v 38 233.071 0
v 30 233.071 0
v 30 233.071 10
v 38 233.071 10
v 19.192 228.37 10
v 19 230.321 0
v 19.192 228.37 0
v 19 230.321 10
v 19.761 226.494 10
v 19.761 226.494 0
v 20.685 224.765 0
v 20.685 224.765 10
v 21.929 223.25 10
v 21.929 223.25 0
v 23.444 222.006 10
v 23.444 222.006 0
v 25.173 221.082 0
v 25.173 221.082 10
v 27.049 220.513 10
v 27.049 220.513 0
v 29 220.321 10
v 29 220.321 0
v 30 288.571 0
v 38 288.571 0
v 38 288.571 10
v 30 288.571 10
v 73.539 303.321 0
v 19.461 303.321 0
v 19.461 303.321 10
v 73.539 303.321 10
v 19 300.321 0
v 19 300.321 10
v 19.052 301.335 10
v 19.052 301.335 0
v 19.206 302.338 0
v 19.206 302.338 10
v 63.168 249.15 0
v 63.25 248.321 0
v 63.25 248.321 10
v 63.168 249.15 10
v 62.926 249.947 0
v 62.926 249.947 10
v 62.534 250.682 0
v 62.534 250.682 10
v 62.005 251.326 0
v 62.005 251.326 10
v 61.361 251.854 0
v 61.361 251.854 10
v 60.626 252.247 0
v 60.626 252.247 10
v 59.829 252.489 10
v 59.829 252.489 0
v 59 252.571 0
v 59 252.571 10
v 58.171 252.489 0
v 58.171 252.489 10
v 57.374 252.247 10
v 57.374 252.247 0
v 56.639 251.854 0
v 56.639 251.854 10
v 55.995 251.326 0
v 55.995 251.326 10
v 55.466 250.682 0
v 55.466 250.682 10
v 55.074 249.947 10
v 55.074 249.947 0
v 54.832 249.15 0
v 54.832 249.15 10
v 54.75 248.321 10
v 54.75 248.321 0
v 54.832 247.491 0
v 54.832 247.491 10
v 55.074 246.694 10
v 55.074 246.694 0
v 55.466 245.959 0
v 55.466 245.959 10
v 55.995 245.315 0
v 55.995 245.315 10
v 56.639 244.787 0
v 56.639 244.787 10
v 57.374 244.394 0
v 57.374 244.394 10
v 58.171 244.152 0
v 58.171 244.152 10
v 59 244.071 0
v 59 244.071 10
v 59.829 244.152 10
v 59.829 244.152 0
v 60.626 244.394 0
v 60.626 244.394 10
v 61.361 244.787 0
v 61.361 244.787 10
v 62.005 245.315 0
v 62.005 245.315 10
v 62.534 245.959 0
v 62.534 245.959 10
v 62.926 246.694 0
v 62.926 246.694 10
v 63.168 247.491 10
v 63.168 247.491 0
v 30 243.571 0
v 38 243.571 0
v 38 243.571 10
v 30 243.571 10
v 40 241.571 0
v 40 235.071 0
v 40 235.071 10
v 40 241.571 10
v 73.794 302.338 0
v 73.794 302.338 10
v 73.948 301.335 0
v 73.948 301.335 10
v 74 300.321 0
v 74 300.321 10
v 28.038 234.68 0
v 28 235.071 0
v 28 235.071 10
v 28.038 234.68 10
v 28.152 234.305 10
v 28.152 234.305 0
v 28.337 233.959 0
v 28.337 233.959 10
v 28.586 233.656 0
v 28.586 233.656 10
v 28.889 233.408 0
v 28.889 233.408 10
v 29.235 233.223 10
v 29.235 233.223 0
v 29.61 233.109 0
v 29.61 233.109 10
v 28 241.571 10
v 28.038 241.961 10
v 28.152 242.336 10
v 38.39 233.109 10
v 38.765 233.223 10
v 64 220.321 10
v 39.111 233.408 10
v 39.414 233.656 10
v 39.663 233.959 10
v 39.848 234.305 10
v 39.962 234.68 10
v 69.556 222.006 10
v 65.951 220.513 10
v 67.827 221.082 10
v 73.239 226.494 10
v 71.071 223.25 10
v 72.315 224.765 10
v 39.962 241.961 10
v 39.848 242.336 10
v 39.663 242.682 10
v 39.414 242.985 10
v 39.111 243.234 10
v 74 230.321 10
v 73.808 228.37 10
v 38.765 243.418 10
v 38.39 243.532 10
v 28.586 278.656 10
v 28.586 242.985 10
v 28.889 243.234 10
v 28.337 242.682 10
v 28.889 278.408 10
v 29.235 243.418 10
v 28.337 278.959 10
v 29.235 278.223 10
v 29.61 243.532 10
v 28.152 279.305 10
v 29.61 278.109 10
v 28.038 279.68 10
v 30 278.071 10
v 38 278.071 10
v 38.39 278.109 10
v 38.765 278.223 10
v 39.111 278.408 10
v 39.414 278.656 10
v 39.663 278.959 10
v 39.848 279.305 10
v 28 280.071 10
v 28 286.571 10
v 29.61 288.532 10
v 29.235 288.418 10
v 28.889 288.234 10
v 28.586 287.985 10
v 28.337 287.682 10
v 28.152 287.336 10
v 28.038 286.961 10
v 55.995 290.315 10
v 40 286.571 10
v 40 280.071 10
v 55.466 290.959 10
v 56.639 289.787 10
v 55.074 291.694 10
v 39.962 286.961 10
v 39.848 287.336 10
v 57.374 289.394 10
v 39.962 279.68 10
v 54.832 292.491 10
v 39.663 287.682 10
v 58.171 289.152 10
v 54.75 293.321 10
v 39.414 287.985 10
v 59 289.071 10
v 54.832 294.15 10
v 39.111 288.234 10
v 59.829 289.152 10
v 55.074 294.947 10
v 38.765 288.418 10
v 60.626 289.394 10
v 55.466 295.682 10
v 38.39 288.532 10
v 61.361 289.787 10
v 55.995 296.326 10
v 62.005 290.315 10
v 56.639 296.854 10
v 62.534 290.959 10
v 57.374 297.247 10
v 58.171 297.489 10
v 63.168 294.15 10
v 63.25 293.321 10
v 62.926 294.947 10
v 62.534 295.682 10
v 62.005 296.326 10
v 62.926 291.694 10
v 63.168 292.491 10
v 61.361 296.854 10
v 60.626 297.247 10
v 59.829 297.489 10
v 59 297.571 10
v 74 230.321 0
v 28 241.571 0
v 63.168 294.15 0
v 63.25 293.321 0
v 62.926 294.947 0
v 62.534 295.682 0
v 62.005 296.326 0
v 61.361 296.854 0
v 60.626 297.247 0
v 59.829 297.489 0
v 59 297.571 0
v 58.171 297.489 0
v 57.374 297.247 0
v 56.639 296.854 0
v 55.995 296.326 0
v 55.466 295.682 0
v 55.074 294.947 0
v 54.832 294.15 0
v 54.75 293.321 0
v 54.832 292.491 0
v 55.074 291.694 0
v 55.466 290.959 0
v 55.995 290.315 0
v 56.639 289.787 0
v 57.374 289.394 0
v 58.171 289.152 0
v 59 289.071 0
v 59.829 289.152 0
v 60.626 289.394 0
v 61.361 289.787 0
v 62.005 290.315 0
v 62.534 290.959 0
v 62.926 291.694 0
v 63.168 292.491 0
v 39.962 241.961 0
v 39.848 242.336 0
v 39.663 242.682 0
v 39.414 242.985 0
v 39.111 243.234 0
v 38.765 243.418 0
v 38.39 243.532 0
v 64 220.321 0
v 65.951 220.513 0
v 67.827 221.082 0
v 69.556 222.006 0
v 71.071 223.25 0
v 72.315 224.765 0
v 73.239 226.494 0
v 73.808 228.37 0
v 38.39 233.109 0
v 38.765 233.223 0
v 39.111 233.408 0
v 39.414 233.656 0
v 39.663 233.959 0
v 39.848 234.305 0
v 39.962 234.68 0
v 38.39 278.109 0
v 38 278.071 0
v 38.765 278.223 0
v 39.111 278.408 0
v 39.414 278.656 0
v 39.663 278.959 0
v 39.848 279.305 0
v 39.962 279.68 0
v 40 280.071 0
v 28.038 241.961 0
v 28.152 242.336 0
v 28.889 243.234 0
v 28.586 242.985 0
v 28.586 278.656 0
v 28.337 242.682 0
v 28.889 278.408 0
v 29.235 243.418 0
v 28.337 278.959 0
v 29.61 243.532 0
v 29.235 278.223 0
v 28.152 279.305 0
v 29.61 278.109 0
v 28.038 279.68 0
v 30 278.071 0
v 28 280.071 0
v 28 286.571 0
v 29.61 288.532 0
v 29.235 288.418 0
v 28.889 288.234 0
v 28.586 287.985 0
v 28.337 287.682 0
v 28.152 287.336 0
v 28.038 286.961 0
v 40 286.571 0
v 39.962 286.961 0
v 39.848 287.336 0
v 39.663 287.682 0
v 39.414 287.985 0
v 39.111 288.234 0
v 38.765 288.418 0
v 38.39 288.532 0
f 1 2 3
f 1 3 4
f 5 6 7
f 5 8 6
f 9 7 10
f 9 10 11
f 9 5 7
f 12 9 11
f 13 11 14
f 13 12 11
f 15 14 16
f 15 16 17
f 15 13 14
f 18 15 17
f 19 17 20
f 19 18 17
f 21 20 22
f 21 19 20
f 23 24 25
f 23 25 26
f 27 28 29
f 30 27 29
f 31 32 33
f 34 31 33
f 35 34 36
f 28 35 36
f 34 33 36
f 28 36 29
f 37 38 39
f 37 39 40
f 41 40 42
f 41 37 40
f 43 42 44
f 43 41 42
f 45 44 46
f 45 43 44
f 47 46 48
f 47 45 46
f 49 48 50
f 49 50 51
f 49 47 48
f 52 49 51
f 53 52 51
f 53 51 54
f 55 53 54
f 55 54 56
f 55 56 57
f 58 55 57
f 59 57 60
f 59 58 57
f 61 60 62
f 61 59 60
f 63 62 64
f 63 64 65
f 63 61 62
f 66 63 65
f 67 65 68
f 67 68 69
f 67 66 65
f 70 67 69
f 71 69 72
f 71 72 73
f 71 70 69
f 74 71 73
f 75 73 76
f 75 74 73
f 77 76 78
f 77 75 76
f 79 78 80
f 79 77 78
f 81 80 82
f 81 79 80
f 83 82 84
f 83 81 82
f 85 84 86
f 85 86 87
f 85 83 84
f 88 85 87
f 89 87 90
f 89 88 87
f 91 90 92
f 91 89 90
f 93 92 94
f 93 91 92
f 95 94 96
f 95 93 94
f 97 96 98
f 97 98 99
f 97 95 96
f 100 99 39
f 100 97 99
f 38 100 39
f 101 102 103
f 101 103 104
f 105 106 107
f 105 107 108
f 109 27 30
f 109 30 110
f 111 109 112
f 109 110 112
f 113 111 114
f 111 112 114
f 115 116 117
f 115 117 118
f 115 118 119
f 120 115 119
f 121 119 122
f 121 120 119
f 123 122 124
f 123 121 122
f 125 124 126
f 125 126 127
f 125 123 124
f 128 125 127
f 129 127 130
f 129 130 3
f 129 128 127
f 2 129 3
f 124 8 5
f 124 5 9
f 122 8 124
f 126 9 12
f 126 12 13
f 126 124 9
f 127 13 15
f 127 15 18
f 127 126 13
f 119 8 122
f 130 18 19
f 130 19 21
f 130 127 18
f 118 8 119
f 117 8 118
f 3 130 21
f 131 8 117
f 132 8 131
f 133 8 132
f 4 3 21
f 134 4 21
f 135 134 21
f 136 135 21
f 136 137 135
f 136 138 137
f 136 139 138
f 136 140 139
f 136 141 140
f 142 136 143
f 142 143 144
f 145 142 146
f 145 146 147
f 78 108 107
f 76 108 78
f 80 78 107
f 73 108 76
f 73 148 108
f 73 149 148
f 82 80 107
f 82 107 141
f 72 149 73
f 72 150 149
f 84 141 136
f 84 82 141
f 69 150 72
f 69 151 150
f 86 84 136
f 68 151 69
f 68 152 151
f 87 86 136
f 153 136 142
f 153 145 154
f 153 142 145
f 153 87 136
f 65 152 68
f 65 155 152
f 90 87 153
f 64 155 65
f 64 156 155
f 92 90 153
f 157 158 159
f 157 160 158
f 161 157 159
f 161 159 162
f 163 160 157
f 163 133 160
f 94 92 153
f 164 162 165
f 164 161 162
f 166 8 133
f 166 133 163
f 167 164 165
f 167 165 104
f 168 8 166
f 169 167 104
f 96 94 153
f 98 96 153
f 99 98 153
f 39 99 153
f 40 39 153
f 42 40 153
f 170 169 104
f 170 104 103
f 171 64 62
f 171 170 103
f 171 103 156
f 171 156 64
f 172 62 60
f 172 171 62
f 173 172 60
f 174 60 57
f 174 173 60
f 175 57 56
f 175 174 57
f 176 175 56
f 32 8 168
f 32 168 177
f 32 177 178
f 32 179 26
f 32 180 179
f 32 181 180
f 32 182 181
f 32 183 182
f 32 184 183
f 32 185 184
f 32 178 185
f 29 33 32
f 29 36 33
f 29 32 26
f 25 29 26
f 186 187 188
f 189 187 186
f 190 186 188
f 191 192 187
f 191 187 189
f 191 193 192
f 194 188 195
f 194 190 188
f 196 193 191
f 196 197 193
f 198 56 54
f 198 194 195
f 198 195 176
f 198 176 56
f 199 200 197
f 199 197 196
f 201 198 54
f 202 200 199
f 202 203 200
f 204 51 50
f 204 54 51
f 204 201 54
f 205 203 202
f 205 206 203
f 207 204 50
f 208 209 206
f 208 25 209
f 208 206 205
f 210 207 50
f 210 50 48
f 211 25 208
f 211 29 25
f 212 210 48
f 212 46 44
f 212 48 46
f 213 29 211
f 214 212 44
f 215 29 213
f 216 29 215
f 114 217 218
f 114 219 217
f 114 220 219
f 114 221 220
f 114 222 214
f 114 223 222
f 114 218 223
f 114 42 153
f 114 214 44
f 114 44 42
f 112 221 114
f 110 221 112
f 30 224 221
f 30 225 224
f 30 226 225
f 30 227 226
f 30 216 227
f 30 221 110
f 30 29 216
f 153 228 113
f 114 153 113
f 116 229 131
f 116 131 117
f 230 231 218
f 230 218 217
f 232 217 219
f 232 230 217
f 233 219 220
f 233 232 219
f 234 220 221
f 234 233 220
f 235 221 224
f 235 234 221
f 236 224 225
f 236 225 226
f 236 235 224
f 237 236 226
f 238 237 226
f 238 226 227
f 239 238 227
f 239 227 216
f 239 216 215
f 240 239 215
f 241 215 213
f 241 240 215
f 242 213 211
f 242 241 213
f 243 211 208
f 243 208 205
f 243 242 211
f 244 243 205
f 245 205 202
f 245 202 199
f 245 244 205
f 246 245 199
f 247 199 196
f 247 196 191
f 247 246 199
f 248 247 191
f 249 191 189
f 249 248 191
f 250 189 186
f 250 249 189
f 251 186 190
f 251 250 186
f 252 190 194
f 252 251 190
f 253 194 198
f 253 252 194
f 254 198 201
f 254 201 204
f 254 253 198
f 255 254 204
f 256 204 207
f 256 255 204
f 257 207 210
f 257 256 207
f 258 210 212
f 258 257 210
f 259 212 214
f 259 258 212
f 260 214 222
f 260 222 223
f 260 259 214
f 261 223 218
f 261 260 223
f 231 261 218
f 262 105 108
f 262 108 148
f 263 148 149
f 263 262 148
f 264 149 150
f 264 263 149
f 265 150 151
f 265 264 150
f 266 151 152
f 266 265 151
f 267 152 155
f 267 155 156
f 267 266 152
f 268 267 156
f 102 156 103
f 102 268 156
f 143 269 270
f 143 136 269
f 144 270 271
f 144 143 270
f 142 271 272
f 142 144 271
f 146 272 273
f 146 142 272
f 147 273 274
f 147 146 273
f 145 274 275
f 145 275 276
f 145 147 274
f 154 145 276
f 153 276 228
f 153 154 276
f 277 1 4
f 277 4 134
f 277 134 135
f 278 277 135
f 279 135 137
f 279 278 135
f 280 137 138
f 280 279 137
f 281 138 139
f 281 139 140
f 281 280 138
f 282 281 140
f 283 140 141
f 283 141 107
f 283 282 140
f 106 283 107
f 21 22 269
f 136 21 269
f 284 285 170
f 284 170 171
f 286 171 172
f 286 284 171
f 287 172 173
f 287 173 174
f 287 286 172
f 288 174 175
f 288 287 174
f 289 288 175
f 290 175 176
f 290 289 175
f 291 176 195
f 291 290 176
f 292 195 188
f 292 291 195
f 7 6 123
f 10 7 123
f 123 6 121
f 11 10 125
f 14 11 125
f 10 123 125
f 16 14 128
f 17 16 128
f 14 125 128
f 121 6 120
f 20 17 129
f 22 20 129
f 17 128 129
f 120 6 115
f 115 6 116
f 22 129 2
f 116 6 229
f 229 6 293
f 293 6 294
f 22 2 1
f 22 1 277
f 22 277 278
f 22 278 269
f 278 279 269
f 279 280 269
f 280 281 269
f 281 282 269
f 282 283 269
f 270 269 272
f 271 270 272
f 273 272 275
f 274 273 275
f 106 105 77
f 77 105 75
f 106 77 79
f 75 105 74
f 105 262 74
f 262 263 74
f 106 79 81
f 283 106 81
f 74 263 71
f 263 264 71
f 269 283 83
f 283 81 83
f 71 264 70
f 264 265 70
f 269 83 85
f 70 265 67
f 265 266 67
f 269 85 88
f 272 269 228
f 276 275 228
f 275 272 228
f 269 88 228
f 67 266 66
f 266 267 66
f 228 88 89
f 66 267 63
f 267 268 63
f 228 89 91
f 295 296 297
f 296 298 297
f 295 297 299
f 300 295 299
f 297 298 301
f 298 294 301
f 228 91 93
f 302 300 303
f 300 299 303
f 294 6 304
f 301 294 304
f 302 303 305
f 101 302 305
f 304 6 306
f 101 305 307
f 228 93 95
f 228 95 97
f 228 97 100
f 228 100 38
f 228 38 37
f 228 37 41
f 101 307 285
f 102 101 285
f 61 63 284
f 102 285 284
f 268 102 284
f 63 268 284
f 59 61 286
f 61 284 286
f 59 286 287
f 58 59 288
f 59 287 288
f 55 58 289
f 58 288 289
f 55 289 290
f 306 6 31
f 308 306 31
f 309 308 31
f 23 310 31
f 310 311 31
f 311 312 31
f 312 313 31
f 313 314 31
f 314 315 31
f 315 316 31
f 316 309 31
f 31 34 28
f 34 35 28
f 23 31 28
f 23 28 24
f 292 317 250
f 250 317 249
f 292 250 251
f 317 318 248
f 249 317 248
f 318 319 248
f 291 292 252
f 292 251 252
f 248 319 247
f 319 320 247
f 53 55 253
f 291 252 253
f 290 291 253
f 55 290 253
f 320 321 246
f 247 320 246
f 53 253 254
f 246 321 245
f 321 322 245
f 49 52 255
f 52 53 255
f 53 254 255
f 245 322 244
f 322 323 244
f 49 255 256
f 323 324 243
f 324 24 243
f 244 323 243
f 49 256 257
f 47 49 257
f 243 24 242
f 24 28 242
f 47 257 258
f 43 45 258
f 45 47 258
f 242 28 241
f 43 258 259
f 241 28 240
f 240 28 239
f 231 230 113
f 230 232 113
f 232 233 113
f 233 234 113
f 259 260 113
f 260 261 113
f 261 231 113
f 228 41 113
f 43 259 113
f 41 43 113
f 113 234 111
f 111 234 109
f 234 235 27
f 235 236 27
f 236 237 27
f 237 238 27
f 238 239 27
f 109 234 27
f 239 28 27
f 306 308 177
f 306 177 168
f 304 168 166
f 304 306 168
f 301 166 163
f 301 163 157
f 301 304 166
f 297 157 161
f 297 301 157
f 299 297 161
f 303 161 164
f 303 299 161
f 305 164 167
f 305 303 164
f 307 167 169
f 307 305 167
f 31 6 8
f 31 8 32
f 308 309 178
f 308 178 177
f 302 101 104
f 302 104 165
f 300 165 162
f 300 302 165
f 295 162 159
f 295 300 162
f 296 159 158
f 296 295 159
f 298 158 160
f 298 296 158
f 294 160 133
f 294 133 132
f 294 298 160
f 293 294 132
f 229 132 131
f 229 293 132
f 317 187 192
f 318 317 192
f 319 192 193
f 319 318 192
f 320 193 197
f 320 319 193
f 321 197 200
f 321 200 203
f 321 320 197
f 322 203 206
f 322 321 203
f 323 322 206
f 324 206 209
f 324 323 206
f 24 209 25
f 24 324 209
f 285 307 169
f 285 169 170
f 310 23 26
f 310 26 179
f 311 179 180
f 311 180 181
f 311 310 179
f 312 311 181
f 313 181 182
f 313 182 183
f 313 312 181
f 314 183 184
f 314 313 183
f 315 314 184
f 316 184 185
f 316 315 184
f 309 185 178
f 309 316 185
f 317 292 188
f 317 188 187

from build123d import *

# Parameters (mm, degrees)
SKETCH2_W           = 55
SKETCH2_H           = 90
SKETCH2_R           = 4.25
BOSS_EXTRUDE1_DEPTH = 10
FILLET1_R           = 10
CUT_EXTRUDE1_DEPTH  = 600


with BuildPart() as part:
    # Sketch2 → Boss-Extrude1 (new body)
    with BuildSketch(Plane.XY):
        with Locations((46.5, 265.320623632)):
            Rectangle(SKETCH2_W, SKETCH2_H)
        with Locations((59, 293.320623632)):
            Circle(SKETCH2_R, mode=Mode.SUBTRACT)
        with Locations((59, 248.320623632)):
            Circle(SKETCH2_R, mode=Mode.SUBTRACT)
        with BuildLine():
            Line((30, 278.070623632), (38, 278.070623632))
            ThreePointArc((38, 278.070623632), (39.414213562, 278.656410069), (40, 280.070623632))
            Line((40, 280.070623632), (40, 286.570623632))
            ThreePointArc((40, 286.570623632), (39.414213562, 287.984837194), (38, 288.570623632))
            Line((38, 288.570623632), (30, 288.570623632))
            ThreePointArc((30, 288.570623632), (28.585786438, 287.984837194), (28, 286.570623632))
            Line((28, 286.570623632), (28, 280.070623632))
            ThreePointArc((28, 280.070623632), (28.585786438, 278.656410069), (30, 278.070623632))
        make_face(mode=Mode.SUBTRACT)
        with BuildLine():
            Line((30, 233.070623632), (38, 233.070623632))
            ThreePointArc((38, 233.070623632), (39.414213562, 233.656410069), (40, 235.070623632))
            Line((40, 235.070623632), (40, 241.570623632))
            ThreePointArc((40, 241.570623632), (39.414213562, 242.984837194), (38, 243.570623632))
            Line((38, 243.570623632), (30, 243.570623632))
            ThreePointArc((30, 243.570623632), (28.585786438, 242.984837194), (28, 241.570623632))
            Line((28, 241.570623632), (28, 235.070623632))
            ThreePointArc((28, 235.070623632), (28.585786438, 233.656410069), (30, 233.070623632))
        make_face(mode=Mode.SUBTRACT)
    extrude(amount=BOSS_EXTRUDE1_DEPTH)

    # Fillet1
    fillet1_edges = [part.edges().sort_by_distance(p)[0] for p in [
        (74, 220.320623632, 5),
        (19, 220.320623632, 5),
        (19, 310.320623632, 5),
        (74, 310.320623632, 5),
    ]]
    fillet(fillet1_edges, radius=FILLET1_R)

    # Sketch4 → Cut-Extrude1 (cut)
    with BuildSketch(Plane(origin=(-127, 1084.797720172, -1205.109910301), x_dir=(0, 1, 0), z_dir=(-1, 0, 0))):
        Polygon((-781.47709654, -1215.209910301), (-501.47709654, -1215.209910301), (-501.47709654, -743.209910301), (-781.47709654, -743.2099103), align=None)
        with BuildLine():
            Line((-206.47709654, -743.209910301), (-96.47709654, -743.209910301))
            ThreePointArc((-96.47709654, -743.209910301), (-89.406028728, -746.138842489), (-86.47709654, -753.209910301))
            Line((-86.47709654, -753.209910301), (-86.47709654, -1205.209910301))
            ThreePointArc((-86.47709654, -1205.209910301), (-89.406028728, -1212.280978113), (-96.47709654, -1215.209910301))
            Line((-96.47709654, -1215.209910301), (-206.47709654, -1215.209910301))
            ThreePointArc((-206.47709654, -1215.209910301), (-213.548164352, -1212.280978113), (-216.47709654, -1205.209910301))
            Line((-216.47709654, -1205.209910301), (-216.47709654, -753.209910301))
            ThreePointArc((-216.47709654, -753.209910301), (-213.548164352, -746.138842489), (-206.47709654, -743.209910301))
        make_face()
    extrude(amount=-CUT_EXTRUDE1_DEPTH, mode=Mode.SUBTRACT)


solid = part.part
